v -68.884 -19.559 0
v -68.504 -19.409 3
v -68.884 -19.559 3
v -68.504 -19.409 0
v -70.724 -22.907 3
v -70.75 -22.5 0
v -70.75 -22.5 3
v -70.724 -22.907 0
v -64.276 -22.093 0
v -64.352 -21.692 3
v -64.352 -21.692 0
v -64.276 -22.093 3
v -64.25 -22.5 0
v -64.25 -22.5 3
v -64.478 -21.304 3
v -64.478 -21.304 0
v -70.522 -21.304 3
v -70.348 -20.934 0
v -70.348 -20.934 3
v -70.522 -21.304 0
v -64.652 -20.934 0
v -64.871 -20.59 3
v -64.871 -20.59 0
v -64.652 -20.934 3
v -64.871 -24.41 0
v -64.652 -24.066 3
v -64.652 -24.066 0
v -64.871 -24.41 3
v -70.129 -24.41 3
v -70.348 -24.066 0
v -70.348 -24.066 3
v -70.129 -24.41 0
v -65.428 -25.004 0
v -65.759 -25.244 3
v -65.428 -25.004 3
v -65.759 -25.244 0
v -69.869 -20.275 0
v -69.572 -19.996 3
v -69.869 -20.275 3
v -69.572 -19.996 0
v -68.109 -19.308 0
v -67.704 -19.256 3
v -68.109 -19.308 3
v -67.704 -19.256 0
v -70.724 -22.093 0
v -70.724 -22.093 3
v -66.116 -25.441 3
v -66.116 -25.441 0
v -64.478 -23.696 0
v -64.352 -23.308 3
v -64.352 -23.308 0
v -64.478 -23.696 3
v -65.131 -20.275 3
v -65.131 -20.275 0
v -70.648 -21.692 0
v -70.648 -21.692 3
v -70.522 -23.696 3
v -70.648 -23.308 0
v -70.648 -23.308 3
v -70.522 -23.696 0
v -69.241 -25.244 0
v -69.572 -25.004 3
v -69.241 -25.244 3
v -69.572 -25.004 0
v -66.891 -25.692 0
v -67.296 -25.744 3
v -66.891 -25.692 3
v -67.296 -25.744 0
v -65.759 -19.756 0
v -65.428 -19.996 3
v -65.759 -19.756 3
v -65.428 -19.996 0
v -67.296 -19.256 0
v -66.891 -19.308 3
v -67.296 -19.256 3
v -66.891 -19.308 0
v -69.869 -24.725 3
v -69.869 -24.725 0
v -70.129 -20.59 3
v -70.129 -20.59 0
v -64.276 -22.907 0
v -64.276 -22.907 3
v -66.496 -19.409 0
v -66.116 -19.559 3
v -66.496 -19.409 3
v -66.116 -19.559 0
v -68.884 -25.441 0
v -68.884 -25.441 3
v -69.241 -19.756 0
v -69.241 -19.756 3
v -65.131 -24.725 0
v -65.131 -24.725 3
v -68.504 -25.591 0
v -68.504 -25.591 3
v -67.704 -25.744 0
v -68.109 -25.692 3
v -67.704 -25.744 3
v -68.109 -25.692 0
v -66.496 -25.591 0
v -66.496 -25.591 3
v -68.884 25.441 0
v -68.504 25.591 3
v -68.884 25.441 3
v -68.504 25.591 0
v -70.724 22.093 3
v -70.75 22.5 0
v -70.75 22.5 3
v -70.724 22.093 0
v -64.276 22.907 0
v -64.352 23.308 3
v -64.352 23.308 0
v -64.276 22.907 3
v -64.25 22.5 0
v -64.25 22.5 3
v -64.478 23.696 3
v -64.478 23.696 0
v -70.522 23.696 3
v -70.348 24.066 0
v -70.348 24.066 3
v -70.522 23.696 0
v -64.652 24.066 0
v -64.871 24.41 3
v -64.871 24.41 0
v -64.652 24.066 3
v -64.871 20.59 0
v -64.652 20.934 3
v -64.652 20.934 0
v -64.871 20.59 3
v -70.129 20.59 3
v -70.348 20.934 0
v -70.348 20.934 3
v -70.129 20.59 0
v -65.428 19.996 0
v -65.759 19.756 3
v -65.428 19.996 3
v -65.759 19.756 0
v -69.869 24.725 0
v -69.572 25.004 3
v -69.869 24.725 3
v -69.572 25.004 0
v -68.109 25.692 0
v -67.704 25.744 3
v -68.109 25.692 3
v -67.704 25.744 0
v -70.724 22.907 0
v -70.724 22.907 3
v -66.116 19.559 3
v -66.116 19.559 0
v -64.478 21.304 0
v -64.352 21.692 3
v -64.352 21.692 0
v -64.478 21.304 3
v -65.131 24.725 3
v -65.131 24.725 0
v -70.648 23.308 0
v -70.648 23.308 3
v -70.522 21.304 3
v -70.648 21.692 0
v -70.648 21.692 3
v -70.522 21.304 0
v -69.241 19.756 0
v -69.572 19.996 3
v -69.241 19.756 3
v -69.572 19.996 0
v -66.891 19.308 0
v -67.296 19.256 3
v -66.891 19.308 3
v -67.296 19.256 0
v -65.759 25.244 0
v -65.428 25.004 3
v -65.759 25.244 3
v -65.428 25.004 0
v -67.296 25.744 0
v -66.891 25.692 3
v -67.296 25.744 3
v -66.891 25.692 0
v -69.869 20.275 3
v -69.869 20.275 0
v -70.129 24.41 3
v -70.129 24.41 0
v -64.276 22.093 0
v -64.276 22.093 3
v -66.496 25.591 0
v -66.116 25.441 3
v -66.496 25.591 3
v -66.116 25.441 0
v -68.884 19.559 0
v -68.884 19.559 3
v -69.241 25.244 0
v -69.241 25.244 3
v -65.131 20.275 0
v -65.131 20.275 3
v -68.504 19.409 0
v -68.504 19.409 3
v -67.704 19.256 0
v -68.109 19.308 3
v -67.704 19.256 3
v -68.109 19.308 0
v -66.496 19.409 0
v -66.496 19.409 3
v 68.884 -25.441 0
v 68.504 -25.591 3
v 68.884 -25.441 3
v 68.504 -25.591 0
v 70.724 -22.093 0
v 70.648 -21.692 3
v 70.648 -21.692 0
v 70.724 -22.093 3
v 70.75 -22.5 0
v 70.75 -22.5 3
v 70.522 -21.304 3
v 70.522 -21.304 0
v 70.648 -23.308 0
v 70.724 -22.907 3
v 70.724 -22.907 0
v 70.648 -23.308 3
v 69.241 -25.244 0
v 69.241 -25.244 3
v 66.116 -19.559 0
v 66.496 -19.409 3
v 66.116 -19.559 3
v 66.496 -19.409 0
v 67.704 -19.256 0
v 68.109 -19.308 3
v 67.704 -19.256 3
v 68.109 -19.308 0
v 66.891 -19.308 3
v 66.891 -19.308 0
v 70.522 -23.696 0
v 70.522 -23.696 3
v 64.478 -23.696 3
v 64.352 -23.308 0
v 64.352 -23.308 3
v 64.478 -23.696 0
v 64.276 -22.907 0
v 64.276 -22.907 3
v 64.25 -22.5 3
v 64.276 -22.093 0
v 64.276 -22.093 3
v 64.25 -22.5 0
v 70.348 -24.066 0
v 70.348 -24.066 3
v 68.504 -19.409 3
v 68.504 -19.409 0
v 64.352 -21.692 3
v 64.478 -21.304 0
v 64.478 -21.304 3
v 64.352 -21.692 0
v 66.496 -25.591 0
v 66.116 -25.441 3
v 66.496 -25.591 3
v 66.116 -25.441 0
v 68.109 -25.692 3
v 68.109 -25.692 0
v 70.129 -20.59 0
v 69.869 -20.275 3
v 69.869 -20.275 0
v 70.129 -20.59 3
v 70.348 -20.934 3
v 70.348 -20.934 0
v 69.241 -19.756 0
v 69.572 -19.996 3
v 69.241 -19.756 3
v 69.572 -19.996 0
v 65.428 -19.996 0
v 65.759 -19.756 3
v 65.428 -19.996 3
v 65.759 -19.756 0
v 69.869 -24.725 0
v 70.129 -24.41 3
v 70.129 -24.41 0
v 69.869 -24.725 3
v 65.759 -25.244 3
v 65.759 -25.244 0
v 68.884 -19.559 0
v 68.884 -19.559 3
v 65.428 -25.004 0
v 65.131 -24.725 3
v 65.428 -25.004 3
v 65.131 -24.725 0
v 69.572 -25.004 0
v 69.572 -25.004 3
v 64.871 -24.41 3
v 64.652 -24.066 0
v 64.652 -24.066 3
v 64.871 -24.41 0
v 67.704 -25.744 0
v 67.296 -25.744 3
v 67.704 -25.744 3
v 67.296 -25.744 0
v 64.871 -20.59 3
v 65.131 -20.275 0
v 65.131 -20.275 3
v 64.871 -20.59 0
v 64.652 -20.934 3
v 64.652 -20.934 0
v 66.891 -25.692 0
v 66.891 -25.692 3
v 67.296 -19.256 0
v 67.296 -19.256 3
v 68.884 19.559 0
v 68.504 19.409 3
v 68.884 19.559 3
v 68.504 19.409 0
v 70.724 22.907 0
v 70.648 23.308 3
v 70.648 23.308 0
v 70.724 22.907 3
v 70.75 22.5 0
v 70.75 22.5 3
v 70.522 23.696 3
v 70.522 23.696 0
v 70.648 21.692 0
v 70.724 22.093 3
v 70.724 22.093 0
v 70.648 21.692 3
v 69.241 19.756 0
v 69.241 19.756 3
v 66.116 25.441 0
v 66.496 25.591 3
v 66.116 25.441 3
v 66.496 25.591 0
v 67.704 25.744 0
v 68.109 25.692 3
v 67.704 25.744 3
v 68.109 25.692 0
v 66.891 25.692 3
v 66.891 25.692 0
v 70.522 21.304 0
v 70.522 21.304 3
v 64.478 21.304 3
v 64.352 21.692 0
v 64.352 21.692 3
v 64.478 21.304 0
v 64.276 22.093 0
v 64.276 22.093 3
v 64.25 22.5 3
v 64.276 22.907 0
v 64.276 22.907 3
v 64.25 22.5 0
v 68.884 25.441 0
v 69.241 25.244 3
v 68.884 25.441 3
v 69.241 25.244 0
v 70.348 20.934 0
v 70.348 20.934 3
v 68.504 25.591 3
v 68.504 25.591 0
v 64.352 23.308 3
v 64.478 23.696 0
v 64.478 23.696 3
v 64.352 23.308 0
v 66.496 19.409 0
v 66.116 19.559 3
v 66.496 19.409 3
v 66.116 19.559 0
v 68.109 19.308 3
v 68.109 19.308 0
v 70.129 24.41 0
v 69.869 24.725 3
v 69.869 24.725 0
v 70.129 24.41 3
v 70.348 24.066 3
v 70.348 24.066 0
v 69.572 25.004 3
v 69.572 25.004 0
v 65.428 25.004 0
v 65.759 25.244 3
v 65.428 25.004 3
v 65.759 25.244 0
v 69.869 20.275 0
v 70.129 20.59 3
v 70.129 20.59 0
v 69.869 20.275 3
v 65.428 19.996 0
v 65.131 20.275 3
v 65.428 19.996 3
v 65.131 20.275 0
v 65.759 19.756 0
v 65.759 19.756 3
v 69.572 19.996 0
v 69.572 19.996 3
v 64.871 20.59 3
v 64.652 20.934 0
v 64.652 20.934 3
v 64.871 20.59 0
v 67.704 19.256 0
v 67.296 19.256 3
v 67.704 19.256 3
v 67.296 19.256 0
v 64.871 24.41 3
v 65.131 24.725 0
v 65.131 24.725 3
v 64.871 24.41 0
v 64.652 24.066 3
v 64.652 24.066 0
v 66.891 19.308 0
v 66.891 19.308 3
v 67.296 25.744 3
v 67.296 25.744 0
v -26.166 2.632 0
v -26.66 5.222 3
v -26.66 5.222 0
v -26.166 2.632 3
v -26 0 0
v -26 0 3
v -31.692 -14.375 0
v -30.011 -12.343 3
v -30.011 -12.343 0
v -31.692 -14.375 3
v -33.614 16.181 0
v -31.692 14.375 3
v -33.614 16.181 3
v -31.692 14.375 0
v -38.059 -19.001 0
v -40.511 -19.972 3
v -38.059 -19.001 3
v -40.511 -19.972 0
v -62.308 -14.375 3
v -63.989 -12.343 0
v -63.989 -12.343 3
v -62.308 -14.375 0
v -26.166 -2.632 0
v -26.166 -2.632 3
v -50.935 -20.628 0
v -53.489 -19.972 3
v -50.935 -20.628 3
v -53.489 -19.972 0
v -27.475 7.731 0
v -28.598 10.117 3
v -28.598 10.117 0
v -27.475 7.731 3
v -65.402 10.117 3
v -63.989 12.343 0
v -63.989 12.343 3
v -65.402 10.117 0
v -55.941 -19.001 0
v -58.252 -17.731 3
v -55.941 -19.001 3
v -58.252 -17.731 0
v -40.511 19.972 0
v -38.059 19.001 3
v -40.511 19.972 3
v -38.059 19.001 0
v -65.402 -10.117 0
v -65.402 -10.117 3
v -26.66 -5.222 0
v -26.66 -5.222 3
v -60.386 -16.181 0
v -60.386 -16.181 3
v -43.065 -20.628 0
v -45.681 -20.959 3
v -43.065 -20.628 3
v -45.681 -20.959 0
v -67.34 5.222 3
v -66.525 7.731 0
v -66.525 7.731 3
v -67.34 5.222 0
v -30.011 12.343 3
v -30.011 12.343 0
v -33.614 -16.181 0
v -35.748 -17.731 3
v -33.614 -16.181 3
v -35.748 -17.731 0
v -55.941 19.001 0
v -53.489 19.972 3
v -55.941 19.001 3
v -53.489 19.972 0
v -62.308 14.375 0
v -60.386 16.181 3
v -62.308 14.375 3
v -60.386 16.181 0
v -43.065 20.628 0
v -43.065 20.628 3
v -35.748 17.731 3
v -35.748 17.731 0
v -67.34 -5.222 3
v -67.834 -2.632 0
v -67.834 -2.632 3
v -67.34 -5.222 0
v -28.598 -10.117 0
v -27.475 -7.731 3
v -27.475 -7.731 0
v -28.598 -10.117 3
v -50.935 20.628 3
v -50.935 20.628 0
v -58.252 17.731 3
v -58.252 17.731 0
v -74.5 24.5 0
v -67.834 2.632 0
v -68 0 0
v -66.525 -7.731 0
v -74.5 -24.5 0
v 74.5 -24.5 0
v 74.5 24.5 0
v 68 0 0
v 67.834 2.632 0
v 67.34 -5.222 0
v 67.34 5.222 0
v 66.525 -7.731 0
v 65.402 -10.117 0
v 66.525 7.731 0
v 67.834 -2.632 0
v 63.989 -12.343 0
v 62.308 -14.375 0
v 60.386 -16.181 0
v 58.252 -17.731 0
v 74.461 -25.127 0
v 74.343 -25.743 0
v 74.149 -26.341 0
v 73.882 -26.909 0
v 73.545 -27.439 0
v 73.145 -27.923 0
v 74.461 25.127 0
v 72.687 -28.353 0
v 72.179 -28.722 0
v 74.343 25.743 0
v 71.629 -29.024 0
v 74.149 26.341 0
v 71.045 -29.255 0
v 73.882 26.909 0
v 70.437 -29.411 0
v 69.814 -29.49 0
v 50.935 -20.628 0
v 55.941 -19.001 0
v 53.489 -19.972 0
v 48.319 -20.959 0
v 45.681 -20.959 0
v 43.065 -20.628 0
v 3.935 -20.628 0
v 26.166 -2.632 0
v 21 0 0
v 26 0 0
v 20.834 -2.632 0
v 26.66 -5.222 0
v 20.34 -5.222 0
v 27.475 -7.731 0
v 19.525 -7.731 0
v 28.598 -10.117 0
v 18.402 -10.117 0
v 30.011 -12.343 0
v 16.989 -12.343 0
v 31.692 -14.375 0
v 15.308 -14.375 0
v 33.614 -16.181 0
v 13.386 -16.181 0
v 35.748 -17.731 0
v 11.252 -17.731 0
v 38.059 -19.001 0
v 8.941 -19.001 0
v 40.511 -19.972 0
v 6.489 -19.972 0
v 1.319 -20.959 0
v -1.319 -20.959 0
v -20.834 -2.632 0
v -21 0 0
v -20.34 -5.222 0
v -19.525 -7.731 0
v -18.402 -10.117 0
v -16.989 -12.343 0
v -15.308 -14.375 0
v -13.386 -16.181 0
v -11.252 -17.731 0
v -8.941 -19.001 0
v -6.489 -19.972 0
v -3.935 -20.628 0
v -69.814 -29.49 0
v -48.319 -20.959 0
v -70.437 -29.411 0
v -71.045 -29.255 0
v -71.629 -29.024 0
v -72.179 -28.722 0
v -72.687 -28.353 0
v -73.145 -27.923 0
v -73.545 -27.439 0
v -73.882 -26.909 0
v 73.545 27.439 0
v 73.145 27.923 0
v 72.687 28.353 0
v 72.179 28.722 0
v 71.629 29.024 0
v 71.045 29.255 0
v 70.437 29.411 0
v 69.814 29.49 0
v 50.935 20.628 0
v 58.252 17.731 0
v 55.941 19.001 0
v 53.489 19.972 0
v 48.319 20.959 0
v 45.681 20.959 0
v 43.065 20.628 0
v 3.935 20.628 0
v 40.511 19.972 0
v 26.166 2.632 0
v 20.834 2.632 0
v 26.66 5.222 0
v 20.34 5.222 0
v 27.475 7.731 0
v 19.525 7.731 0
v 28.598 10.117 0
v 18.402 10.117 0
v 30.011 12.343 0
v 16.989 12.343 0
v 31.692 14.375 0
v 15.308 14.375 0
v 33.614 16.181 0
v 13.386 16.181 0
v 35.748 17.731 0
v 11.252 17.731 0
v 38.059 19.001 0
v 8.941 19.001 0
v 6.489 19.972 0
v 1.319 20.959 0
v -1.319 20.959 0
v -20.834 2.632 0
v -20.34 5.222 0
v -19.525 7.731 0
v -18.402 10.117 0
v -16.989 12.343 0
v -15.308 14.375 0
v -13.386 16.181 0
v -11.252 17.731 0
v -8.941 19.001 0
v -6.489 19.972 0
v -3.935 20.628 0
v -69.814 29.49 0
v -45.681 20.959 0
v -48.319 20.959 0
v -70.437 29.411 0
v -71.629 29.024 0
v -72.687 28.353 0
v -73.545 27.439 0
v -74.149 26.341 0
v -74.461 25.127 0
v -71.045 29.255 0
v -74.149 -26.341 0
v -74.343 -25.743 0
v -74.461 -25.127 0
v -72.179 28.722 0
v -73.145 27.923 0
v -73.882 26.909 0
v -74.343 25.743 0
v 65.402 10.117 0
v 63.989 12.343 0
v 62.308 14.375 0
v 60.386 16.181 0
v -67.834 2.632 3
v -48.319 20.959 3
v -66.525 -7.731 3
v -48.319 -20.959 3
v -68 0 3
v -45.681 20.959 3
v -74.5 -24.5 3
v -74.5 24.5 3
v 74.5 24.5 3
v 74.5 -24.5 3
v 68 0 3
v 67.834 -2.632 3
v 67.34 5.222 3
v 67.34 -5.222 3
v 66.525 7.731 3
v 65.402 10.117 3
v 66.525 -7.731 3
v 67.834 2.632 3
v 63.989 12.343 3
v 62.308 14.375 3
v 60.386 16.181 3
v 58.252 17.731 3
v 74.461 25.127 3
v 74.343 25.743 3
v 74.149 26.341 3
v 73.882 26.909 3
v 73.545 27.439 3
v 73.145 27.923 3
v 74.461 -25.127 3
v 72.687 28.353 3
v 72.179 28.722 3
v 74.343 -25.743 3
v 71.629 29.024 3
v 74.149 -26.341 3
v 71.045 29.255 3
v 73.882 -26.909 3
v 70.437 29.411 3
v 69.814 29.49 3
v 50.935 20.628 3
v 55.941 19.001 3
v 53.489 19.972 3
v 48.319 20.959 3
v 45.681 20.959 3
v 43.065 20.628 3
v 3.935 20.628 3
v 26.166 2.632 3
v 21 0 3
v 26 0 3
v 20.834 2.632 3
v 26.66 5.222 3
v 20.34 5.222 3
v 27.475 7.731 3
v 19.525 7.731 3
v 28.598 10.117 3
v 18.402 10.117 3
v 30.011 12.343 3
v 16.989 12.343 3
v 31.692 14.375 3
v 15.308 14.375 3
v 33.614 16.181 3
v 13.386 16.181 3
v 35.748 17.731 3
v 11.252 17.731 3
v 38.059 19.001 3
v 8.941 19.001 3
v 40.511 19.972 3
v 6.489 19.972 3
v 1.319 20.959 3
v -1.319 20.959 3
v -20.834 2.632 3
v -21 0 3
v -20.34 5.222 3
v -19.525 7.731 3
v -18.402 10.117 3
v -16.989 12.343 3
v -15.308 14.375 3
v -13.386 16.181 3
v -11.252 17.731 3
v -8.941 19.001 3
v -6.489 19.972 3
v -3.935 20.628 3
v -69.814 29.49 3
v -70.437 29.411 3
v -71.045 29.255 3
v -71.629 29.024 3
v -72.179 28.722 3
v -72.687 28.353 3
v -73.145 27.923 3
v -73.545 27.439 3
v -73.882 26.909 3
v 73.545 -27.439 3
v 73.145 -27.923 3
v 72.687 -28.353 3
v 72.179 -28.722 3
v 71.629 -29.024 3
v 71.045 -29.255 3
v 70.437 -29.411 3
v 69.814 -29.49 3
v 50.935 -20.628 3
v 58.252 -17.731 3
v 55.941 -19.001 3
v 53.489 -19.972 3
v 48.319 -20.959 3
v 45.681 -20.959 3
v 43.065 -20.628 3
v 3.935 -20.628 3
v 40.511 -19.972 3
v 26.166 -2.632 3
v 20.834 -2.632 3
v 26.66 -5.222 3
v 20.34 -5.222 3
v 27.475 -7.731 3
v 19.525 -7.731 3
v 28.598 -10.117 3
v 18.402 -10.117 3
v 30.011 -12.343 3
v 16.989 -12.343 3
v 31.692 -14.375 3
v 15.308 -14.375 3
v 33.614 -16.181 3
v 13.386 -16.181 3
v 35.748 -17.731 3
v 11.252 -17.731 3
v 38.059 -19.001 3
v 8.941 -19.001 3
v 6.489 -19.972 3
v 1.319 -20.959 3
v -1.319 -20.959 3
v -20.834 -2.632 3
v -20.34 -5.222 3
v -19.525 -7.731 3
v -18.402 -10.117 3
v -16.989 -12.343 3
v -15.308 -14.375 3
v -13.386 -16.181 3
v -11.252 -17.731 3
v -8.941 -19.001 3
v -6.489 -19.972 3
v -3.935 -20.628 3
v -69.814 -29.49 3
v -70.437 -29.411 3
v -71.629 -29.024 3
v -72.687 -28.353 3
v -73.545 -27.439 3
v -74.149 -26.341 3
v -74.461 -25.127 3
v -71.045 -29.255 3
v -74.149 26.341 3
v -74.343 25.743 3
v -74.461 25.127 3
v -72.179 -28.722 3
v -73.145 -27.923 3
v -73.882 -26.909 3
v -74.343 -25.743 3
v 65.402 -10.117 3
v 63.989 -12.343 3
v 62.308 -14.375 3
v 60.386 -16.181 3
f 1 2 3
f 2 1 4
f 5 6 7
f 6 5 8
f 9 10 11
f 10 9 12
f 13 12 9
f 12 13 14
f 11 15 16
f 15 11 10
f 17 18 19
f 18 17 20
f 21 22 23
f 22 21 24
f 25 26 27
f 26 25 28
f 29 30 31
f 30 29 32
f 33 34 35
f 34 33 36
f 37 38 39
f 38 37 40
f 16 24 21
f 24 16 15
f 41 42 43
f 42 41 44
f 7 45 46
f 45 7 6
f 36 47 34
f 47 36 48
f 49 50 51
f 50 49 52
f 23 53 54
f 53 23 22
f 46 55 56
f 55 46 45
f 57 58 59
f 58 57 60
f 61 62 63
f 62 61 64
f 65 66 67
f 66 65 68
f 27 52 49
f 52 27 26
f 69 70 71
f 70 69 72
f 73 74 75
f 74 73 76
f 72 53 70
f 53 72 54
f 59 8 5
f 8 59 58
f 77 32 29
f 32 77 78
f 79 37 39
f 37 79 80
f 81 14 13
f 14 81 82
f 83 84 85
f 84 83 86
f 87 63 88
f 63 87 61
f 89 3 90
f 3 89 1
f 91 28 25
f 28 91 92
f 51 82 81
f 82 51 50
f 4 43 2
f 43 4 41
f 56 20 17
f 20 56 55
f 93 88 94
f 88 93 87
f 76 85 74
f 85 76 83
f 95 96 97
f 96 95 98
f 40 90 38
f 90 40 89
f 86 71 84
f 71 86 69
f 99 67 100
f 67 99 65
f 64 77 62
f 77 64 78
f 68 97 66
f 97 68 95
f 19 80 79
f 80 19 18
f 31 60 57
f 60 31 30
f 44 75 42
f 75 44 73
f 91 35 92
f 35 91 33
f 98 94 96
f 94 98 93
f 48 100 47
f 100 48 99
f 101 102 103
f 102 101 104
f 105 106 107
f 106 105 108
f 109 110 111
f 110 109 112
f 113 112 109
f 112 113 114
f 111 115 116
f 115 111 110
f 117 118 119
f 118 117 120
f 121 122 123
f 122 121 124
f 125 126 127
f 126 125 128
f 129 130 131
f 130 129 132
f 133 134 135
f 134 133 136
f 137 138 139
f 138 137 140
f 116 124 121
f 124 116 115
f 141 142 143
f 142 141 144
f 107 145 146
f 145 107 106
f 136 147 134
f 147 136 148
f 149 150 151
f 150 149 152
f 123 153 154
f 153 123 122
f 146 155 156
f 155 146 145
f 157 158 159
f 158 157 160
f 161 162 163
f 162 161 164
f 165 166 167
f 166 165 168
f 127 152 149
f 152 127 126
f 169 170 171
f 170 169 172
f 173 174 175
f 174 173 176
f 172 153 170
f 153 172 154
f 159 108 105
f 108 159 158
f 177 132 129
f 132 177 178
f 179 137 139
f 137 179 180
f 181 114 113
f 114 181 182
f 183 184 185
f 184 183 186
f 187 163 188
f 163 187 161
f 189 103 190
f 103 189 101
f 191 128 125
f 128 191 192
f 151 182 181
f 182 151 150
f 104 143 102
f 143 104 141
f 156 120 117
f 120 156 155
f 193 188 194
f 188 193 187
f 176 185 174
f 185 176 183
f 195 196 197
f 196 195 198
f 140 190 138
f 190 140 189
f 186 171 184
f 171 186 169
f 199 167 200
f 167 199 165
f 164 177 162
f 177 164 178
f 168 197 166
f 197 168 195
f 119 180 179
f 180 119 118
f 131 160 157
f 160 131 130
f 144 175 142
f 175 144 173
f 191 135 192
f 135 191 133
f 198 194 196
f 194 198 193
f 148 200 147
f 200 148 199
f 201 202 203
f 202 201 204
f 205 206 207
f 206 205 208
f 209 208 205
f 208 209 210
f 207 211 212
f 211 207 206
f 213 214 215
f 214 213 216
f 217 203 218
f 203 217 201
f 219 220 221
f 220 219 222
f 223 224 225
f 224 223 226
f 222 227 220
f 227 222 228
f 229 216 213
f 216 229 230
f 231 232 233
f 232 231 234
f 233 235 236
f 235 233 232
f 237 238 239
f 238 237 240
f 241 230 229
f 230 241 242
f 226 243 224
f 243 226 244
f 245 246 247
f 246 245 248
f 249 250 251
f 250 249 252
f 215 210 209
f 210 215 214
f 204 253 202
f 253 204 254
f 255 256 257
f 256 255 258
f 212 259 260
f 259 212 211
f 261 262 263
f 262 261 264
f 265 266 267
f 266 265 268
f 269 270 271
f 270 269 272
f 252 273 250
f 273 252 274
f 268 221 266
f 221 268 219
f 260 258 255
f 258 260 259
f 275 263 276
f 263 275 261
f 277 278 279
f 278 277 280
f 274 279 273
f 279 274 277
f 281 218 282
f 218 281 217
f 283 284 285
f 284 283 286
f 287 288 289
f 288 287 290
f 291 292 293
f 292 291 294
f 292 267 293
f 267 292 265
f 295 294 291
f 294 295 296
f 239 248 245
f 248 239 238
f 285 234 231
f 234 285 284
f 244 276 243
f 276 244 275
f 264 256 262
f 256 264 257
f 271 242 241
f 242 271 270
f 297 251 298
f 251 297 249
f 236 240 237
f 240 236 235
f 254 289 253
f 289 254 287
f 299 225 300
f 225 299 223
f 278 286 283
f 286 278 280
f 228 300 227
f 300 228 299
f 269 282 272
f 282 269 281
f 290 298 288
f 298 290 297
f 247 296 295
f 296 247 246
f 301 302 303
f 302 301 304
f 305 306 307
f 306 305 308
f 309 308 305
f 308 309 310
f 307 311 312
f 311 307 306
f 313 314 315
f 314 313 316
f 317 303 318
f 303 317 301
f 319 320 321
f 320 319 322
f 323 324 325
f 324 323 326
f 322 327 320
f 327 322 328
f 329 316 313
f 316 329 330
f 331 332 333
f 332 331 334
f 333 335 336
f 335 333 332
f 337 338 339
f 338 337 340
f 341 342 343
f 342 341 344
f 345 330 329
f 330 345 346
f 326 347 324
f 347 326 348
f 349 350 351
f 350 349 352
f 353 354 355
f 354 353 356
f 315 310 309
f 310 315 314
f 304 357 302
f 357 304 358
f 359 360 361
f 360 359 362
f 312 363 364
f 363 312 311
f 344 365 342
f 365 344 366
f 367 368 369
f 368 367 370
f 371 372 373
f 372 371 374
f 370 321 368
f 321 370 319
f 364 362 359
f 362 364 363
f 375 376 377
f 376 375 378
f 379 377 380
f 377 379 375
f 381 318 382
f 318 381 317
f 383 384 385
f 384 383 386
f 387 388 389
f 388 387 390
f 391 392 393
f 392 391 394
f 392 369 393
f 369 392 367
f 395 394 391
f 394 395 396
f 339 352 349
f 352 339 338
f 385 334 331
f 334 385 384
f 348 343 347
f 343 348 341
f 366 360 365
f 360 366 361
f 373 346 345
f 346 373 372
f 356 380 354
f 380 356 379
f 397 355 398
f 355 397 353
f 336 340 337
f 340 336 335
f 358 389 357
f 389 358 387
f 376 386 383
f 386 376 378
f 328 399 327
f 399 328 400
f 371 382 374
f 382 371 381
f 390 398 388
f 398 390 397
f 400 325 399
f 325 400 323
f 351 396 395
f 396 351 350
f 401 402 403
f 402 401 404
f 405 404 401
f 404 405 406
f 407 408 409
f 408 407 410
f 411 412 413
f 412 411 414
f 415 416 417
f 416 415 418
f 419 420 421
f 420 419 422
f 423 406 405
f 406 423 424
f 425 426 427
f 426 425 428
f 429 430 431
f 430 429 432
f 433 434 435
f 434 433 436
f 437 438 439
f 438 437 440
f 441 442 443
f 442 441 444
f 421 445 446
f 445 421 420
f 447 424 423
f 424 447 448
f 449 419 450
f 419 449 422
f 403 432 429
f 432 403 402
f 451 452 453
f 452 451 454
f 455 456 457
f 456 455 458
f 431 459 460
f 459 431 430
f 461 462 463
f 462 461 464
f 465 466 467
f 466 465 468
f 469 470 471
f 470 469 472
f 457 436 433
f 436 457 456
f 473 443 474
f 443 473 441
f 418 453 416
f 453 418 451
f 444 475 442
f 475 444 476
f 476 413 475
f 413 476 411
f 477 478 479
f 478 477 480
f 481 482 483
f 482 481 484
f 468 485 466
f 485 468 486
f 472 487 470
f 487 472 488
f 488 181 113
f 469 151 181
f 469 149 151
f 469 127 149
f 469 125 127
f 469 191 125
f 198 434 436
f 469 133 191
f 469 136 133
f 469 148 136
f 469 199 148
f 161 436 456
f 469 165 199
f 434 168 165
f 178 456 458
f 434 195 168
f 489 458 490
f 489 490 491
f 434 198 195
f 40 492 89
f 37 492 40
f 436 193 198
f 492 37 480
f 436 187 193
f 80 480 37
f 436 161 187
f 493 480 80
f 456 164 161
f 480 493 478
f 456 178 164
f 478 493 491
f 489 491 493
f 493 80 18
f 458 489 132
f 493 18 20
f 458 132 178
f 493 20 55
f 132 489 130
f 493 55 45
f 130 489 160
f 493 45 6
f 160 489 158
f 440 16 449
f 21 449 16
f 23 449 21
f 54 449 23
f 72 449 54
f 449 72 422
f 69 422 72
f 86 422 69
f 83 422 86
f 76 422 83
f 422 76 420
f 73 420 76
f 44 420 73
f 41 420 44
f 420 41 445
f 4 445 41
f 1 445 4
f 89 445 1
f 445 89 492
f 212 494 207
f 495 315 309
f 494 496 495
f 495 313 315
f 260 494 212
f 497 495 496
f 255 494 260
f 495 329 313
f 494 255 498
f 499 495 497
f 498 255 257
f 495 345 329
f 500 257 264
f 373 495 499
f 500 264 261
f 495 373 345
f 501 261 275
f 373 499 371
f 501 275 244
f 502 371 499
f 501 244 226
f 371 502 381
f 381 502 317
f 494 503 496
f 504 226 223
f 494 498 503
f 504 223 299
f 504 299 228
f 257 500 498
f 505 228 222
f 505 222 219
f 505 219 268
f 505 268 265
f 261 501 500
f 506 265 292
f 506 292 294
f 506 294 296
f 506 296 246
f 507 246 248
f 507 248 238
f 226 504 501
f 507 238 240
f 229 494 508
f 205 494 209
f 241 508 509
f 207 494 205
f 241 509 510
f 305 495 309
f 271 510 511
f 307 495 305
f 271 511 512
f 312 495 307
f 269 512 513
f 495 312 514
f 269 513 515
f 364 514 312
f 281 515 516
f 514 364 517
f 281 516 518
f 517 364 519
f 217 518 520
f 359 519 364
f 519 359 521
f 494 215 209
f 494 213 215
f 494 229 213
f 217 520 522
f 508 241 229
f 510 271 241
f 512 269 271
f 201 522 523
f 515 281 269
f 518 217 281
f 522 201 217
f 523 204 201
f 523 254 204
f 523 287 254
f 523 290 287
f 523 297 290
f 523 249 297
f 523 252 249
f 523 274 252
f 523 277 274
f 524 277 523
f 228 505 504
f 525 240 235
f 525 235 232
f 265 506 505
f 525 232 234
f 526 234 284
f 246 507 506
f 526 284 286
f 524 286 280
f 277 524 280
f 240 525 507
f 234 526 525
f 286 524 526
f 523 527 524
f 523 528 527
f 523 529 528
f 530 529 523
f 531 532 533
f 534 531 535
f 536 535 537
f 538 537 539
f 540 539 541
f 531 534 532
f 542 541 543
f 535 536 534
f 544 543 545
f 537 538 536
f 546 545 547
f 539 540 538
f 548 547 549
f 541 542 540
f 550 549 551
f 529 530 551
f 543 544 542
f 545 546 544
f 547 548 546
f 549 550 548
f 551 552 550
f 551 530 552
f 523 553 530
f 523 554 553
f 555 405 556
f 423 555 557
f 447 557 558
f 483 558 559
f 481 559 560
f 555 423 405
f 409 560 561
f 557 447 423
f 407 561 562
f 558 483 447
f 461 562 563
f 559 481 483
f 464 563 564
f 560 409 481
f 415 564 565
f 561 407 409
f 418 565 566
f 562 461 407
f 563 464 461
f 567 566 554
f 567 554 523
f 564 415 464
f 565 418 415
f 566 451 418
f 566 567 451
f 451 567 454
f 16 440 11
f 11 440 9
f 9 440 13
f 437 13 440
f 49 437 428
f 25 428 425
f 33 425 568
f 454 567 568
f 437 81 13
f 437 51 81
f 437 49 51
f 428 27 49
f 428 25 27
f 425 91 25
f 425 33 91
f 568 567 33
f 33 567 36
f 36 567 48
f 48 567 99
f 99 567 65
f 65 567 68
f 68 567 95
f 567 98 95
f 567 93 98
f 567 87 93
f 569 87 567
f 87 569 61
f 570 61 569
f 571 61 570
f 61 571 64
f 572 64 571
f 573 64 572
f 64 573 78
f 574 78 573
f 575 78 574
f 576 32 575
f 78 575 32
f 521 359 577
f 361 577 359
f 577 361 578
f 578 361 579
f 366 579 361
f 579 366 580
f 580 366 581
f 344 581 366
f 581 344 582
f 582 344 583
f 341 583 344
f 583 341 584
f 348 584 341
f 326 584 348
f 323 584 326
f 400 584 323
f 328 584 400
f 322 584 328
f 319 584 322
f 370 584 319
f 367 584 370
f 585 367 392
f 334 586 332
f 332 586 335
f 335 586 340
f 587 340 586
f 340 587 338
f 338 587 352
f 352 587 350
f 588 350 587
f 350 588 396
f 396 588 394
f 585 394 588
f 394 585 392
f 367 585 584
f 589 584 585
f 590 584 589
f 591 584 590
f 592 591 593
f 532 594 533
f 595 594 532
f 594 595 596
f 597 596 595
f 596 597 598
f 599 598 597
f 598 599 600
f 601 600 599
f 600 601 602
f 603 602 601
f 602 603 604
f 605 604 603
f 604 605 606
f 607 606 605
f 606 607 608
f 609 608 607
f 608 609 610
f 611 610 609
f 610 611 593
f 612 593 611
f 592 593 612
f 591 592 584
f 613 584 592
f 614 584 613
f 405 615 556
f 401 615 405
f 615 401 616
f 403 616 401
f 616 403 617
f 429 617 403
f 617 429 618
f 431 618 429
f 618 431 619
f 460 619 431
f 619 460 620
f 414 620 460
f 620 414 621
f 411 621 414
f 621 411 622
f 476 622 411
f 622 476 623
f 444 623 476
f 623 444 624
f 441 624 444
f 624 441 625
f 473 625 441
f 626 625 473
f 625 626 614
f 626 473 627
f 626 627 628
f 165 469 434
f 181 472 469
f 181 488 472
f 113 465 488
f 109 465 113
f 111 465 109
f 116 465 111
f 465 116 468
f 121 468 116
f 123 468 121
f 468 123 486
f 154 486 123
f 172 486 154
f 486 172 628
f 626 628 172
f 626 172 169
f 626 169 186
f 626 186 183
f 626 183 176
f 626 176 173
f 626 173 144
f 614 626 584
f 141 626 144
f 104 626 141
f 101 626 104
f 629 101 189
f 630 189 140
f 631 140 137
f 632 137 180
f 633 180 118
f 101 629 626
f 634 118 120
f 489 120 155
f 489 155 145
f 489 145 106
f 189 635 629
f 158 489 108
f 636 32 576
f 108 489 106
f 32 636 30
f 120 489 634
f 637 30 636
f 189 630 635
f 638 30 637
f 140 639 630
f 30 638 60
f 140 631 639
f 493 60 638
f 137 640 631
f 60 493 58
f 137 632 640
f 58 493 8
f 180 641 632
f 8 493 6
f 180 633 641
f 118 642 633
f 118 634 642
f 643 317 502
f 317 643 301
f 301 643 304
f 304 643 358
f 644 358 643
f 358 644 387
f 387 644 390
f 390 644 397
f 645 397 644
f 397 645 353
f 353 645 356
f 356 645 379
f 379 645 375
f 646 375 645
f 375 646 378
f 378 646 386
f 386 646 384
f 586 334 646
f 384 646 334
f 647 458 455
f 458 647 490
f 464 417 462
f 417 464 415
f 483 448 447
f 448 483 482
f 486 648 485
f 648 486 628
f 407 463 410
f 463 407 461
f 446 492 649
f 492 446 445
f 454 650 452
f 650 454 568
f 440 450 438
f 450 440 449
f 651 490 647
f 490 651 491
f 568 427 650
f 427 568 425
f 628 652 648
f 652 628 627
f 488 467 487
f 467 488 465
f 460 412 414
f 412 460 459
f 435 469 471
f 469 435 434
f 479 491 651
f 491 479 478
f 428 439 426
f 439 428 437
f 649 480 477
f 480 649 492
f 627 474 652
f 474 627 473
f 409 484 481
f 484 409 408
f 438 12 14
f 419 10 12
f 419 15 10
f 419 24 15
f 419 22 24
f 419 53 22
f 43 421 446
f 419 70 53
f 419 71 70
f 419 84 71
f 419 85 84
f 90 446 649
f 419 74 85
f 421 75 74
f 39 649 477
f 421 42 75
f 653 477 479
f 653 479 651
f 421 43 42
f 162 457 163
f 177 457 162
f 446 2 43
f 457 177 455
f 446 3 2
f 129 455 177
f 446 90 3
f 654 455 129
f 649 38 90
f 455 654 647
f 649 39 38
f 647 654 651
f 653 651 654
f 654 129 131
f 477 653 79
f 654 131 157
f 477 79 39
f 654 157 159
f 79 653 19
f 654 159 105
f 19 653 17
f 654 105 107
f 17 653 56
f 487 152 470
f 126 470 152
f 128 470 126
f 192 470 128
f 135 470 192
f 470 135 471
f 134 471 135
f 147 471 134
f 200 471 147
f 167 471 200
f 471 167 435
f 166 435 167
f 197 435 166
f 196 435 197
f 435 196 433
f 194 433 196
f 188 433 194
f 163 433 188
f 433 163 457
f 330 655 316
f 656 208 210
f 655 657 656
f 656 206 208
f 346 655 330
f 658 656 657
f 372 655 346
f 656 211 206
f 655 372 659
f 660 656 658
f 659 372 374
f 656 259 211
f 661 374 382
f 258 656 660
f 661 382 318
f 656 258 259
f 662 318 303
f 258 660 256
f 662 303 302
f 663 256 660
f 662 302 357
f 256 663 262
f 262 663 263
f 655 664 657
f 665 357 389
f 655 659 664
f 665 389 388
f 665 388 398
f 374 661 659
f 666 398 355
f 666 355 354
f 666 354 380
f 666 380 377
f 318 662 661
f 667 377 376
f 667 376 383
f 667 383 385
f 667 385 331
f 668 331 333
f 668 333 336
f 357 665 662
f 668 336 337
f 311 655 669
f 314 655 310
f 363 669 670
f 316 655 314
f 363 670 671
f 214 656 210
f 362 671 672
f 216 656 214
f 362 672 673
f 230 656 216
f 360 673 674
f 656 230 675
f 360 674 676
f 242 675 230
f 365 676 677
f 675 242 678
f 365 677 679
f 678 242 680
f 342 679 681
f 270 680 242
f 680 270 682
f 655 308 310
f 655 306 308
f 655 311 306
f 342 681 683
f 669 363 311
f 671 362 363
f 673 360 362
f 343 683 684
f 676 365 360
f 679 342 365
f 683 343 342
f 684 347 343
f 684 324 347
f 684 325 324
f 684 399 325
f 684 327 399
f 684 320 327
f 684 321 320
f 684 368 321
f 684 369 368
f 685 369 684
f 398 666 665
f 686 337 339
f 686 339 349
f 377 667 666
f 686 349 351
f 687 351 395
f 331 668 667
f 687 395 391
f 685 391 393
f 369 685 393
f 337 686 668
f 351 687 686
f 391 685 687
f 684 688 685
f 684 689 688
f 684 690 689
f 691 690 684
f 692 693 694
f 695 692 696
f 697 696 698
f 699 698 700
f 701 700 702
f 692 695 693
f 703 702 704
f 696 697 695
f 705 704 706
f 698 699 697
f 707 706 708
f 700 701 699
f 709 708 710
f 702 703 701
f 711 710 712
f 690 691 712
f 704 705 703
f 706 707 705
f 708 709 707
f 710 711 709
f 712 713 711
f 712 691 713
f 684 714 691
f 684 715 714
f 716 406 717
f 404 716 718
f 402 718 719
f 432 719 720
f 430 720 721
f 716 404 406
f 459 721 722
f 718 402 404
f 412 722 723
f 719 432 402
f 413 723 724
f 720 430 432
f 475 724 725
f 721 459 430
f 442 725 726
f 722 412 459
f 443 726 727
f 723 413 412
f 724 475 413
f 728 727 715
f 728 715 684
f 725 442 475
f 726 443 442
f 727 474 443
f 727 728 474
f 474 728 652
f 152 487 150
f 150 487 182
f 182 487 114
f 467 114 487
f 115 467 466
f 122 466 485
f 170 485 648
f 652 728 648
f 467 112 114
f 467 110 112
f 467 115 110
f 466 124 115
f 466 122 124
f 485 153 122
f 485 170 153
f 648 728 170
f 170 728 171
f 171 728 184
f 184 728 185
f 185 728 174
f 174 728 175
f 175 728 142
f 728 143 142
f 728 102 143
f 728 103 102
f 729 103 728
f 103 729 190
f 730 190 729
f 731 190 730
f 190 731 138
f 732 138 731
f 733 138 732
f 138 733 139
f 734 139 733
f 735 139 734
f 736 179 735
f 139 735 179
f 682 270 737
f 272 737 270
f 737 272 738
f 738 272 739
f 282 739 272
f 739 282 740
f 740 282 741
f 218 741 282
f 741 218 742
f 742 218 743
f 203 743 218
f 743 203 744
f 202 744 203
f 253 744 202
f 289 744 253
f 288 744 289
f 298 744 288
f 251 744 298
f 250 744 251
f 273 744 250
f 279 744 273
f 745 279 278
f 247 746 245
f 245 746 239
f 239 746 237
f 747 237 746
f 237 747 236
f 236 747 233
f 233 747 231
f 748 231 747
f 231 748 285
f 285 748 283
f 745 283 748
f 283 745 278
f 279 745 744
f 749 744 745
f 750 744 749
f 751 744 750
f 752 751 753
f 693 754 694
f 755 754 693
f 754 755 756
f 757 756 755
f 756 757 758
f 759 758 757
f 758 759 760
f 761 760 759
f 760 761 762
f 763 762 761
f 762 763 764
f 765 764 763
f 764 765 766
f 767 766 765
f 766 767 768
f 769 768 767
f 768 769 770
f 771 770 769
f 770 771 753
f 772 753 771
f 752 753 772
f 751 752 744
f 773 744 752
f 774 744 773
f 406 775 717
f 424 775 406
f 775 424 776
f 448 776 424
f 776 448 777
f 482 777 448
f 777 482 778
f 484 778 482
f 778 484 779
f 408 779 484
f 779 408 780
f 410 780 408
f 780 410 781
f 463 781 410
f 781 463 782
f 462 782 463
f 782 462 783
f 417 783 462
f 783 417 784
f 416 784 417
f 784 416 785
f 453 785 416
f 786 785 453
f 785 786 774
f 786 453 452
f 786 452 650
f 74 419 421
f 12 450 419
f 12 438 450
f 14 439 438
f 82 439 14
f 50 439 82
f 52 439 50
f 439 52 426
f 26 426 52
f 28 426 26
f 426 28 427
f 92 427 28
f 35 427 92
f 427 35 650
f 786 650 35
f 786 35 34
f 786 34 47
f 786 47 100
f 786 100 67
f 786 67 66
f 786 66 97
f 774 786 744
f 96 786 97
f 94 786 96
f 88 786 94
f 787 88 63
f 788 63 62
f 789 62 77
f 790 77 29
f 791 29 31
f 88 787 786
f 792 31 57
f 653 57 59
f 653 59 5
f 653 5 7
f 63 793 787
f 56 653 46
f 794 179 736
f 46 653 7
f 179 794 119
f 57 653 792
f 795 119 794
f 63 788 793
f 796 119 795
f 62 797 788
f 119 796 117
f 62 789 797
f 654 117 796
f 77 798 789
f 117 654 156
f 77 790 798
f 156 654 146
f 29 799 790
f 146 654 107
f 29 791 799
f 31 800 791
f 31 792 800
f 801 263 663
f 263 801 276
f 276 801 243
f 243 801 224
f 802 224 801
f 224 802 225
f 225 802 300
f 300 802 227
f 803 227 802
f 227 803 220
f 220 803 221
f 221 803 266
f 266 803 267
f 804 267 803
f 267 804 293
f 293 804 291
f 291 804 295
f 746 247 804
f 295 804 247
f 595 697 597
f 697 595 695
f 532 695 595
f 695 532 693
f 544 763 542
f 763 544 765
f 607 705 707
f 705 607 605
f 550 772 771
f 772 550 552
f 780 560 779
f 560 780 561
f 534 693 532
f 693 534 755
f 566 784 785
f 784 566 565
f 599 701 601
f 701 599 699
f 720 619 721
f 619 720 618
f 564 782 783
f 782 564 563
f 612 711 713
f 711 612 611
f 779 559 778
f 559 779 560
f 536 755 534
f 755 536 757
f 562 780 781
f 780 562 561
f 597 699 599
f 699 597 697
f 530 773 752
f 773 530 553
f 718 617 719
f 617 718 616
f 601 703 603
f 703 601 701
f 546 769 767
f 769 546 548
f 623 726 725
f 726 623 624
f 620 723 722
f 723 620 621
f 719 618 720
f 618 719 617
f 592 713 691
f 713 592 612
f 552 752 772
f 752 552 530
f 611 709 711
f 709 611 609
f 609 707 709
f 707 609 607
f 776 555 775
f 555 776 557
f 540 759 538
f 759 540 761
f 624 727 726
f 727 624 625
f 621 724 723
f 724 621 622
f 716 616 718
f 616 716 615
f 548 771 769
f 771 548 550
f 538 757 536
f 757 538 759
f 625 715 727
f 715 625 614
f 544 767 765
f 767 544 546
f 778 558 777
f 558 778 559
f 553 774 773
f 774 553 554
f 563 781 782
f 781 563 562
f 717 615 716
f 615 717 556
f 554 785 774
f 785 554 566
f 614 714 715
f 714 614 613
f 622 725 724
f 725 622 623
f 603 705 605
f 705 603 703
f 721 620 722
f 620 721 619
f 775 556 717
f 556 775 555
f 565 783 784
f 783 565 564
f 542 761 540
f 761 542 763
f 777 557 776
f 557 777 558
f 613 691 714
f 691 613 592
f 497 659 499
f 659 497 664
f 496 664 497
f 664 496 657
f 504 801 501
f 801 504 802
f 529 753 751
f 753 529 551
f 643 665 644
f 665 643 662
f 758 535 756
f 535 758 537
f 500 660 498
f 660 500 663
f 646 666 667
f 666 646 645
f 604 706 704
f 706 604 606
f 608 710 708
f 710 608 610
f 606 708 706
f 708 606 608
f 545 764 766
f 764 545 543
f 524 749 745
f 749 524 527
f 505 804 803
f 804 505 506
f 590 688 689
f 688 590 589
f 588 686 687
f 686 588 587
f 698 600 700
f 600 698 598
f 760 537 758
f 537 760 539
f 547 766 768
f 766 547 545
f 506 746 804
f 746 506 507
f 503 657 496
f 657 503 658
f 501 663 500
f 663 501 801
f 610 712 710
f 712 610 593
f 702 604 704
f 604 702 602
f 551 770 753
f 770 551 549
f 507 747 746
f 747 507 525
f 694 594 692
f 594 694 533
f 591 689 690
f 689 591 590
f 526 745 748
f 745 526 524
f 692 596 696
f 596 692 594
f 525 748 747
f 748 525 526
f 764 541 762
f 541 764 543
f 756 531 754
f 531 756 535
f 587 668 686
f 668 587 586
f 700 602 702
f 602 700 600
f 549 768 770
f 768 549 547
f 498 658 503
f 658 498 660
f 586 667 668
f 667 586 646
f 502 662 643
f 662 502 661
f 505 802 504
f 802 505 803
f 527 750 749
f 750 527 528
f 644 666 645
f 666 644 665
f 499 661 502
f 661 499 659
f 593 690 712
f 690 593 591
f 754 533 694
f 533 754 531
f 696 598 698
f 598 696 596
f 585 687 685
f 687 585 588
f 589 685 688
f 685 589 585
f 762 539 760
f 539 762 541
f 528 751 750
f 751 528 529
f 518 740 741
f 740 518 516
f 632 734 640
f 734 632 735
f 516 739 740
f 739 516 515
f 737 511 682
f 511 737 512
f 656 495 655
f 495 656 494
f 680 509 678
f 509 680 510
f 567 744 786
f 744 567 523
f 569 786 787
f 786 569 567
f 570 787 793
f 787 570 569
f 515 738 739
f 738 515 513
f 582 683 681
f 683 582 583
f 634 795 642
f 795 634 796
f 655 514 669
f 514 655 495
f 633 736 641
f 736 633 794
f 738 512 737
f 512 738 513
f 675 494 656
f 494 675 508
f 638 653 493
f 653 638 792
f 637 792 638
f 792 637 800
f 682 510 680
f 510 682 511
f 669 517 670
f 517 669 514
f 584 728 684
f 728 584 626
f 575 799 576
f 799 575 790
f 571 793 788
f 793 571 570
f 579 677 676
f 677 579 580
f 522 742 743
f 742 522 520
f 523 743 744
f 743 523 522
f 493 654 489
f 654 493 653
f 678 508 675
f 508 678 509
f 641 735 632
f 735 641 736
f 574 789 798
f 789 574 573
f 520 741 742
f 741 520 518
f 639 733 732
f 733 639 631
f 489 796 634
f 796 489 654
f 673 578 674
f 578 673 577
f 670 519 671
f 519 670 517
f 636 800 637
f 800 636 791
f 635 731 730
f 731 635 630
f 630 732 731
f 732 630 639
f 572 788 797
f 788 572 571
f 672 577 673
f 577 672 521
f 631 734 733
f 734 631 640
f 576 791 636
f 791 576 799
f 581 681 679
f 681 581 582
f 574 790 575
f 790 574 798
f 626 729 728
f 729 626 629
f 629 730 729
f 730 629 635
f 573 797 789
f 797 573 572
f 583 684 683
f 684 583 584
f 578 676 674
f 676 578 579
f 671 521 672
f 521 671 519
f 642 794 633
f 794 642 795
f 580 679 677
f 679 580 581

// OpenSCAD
$fn = 50;

difference() {
	union() {
		hull() {
			translate(v = [-69.5, 24.5, 0]) {
				cylinder(h = 3, r = 5);
			}
			translate(v = [69.5, 24.5, 0]) {
				cylinder(h = 3, r = 5);
			}
			translate(v = [-69.5, -24.5, 0]) {
				cylinder(h = 3, r = 5);
			}
			translate(v = [69.5, -24.5, 0]) {
				cylinder(h = 3, r = 5);
			}
		}
	}
	union() {
		translate(v = [-67.5, -22.5, -100.0]) {
			cylinder(h = 200, r = 3.25);
		}
		translate(v = [-67.5, 22.5, -100.0]) {
			cylinder(h = 200, r = 3.25);
		}
		translate(v = [67.5, -22.5, -100.0]) {
			cylinder(h = 200, r = 3.25);
		}
		translate(v = [67.5, 22.5, -100.0]) {
			cylinder(h = 200, r = 3.25);
		}
		translate(v = [-67.5, -22.5, -100.0]) {
			cylinder(h = 200, r = 1.8);
		}
		translate(v = [-67.5, 22.5, -100.0]) {
			cylinder(h = 200, r = 1.8);
		}
		translate(v = [67.5, -22.5, -100.0]) {
			cylinder(h = 200, r = 1.8);
		}
		translate(v = [67.5, 22.5, -100.0]) {
			cylinder(h = 200, r = 1.8);
		}
		translate(v = [-47.0, 0, 0.0]) {
			cylinder(h = 3, r = 21.0);
		}
		cylinder(h = 3, r = 21.0);
		translate(v = [47.0, 0, 0.0]) {
			cylinder(h = 3, r = 21.0);
		}
	}
}
